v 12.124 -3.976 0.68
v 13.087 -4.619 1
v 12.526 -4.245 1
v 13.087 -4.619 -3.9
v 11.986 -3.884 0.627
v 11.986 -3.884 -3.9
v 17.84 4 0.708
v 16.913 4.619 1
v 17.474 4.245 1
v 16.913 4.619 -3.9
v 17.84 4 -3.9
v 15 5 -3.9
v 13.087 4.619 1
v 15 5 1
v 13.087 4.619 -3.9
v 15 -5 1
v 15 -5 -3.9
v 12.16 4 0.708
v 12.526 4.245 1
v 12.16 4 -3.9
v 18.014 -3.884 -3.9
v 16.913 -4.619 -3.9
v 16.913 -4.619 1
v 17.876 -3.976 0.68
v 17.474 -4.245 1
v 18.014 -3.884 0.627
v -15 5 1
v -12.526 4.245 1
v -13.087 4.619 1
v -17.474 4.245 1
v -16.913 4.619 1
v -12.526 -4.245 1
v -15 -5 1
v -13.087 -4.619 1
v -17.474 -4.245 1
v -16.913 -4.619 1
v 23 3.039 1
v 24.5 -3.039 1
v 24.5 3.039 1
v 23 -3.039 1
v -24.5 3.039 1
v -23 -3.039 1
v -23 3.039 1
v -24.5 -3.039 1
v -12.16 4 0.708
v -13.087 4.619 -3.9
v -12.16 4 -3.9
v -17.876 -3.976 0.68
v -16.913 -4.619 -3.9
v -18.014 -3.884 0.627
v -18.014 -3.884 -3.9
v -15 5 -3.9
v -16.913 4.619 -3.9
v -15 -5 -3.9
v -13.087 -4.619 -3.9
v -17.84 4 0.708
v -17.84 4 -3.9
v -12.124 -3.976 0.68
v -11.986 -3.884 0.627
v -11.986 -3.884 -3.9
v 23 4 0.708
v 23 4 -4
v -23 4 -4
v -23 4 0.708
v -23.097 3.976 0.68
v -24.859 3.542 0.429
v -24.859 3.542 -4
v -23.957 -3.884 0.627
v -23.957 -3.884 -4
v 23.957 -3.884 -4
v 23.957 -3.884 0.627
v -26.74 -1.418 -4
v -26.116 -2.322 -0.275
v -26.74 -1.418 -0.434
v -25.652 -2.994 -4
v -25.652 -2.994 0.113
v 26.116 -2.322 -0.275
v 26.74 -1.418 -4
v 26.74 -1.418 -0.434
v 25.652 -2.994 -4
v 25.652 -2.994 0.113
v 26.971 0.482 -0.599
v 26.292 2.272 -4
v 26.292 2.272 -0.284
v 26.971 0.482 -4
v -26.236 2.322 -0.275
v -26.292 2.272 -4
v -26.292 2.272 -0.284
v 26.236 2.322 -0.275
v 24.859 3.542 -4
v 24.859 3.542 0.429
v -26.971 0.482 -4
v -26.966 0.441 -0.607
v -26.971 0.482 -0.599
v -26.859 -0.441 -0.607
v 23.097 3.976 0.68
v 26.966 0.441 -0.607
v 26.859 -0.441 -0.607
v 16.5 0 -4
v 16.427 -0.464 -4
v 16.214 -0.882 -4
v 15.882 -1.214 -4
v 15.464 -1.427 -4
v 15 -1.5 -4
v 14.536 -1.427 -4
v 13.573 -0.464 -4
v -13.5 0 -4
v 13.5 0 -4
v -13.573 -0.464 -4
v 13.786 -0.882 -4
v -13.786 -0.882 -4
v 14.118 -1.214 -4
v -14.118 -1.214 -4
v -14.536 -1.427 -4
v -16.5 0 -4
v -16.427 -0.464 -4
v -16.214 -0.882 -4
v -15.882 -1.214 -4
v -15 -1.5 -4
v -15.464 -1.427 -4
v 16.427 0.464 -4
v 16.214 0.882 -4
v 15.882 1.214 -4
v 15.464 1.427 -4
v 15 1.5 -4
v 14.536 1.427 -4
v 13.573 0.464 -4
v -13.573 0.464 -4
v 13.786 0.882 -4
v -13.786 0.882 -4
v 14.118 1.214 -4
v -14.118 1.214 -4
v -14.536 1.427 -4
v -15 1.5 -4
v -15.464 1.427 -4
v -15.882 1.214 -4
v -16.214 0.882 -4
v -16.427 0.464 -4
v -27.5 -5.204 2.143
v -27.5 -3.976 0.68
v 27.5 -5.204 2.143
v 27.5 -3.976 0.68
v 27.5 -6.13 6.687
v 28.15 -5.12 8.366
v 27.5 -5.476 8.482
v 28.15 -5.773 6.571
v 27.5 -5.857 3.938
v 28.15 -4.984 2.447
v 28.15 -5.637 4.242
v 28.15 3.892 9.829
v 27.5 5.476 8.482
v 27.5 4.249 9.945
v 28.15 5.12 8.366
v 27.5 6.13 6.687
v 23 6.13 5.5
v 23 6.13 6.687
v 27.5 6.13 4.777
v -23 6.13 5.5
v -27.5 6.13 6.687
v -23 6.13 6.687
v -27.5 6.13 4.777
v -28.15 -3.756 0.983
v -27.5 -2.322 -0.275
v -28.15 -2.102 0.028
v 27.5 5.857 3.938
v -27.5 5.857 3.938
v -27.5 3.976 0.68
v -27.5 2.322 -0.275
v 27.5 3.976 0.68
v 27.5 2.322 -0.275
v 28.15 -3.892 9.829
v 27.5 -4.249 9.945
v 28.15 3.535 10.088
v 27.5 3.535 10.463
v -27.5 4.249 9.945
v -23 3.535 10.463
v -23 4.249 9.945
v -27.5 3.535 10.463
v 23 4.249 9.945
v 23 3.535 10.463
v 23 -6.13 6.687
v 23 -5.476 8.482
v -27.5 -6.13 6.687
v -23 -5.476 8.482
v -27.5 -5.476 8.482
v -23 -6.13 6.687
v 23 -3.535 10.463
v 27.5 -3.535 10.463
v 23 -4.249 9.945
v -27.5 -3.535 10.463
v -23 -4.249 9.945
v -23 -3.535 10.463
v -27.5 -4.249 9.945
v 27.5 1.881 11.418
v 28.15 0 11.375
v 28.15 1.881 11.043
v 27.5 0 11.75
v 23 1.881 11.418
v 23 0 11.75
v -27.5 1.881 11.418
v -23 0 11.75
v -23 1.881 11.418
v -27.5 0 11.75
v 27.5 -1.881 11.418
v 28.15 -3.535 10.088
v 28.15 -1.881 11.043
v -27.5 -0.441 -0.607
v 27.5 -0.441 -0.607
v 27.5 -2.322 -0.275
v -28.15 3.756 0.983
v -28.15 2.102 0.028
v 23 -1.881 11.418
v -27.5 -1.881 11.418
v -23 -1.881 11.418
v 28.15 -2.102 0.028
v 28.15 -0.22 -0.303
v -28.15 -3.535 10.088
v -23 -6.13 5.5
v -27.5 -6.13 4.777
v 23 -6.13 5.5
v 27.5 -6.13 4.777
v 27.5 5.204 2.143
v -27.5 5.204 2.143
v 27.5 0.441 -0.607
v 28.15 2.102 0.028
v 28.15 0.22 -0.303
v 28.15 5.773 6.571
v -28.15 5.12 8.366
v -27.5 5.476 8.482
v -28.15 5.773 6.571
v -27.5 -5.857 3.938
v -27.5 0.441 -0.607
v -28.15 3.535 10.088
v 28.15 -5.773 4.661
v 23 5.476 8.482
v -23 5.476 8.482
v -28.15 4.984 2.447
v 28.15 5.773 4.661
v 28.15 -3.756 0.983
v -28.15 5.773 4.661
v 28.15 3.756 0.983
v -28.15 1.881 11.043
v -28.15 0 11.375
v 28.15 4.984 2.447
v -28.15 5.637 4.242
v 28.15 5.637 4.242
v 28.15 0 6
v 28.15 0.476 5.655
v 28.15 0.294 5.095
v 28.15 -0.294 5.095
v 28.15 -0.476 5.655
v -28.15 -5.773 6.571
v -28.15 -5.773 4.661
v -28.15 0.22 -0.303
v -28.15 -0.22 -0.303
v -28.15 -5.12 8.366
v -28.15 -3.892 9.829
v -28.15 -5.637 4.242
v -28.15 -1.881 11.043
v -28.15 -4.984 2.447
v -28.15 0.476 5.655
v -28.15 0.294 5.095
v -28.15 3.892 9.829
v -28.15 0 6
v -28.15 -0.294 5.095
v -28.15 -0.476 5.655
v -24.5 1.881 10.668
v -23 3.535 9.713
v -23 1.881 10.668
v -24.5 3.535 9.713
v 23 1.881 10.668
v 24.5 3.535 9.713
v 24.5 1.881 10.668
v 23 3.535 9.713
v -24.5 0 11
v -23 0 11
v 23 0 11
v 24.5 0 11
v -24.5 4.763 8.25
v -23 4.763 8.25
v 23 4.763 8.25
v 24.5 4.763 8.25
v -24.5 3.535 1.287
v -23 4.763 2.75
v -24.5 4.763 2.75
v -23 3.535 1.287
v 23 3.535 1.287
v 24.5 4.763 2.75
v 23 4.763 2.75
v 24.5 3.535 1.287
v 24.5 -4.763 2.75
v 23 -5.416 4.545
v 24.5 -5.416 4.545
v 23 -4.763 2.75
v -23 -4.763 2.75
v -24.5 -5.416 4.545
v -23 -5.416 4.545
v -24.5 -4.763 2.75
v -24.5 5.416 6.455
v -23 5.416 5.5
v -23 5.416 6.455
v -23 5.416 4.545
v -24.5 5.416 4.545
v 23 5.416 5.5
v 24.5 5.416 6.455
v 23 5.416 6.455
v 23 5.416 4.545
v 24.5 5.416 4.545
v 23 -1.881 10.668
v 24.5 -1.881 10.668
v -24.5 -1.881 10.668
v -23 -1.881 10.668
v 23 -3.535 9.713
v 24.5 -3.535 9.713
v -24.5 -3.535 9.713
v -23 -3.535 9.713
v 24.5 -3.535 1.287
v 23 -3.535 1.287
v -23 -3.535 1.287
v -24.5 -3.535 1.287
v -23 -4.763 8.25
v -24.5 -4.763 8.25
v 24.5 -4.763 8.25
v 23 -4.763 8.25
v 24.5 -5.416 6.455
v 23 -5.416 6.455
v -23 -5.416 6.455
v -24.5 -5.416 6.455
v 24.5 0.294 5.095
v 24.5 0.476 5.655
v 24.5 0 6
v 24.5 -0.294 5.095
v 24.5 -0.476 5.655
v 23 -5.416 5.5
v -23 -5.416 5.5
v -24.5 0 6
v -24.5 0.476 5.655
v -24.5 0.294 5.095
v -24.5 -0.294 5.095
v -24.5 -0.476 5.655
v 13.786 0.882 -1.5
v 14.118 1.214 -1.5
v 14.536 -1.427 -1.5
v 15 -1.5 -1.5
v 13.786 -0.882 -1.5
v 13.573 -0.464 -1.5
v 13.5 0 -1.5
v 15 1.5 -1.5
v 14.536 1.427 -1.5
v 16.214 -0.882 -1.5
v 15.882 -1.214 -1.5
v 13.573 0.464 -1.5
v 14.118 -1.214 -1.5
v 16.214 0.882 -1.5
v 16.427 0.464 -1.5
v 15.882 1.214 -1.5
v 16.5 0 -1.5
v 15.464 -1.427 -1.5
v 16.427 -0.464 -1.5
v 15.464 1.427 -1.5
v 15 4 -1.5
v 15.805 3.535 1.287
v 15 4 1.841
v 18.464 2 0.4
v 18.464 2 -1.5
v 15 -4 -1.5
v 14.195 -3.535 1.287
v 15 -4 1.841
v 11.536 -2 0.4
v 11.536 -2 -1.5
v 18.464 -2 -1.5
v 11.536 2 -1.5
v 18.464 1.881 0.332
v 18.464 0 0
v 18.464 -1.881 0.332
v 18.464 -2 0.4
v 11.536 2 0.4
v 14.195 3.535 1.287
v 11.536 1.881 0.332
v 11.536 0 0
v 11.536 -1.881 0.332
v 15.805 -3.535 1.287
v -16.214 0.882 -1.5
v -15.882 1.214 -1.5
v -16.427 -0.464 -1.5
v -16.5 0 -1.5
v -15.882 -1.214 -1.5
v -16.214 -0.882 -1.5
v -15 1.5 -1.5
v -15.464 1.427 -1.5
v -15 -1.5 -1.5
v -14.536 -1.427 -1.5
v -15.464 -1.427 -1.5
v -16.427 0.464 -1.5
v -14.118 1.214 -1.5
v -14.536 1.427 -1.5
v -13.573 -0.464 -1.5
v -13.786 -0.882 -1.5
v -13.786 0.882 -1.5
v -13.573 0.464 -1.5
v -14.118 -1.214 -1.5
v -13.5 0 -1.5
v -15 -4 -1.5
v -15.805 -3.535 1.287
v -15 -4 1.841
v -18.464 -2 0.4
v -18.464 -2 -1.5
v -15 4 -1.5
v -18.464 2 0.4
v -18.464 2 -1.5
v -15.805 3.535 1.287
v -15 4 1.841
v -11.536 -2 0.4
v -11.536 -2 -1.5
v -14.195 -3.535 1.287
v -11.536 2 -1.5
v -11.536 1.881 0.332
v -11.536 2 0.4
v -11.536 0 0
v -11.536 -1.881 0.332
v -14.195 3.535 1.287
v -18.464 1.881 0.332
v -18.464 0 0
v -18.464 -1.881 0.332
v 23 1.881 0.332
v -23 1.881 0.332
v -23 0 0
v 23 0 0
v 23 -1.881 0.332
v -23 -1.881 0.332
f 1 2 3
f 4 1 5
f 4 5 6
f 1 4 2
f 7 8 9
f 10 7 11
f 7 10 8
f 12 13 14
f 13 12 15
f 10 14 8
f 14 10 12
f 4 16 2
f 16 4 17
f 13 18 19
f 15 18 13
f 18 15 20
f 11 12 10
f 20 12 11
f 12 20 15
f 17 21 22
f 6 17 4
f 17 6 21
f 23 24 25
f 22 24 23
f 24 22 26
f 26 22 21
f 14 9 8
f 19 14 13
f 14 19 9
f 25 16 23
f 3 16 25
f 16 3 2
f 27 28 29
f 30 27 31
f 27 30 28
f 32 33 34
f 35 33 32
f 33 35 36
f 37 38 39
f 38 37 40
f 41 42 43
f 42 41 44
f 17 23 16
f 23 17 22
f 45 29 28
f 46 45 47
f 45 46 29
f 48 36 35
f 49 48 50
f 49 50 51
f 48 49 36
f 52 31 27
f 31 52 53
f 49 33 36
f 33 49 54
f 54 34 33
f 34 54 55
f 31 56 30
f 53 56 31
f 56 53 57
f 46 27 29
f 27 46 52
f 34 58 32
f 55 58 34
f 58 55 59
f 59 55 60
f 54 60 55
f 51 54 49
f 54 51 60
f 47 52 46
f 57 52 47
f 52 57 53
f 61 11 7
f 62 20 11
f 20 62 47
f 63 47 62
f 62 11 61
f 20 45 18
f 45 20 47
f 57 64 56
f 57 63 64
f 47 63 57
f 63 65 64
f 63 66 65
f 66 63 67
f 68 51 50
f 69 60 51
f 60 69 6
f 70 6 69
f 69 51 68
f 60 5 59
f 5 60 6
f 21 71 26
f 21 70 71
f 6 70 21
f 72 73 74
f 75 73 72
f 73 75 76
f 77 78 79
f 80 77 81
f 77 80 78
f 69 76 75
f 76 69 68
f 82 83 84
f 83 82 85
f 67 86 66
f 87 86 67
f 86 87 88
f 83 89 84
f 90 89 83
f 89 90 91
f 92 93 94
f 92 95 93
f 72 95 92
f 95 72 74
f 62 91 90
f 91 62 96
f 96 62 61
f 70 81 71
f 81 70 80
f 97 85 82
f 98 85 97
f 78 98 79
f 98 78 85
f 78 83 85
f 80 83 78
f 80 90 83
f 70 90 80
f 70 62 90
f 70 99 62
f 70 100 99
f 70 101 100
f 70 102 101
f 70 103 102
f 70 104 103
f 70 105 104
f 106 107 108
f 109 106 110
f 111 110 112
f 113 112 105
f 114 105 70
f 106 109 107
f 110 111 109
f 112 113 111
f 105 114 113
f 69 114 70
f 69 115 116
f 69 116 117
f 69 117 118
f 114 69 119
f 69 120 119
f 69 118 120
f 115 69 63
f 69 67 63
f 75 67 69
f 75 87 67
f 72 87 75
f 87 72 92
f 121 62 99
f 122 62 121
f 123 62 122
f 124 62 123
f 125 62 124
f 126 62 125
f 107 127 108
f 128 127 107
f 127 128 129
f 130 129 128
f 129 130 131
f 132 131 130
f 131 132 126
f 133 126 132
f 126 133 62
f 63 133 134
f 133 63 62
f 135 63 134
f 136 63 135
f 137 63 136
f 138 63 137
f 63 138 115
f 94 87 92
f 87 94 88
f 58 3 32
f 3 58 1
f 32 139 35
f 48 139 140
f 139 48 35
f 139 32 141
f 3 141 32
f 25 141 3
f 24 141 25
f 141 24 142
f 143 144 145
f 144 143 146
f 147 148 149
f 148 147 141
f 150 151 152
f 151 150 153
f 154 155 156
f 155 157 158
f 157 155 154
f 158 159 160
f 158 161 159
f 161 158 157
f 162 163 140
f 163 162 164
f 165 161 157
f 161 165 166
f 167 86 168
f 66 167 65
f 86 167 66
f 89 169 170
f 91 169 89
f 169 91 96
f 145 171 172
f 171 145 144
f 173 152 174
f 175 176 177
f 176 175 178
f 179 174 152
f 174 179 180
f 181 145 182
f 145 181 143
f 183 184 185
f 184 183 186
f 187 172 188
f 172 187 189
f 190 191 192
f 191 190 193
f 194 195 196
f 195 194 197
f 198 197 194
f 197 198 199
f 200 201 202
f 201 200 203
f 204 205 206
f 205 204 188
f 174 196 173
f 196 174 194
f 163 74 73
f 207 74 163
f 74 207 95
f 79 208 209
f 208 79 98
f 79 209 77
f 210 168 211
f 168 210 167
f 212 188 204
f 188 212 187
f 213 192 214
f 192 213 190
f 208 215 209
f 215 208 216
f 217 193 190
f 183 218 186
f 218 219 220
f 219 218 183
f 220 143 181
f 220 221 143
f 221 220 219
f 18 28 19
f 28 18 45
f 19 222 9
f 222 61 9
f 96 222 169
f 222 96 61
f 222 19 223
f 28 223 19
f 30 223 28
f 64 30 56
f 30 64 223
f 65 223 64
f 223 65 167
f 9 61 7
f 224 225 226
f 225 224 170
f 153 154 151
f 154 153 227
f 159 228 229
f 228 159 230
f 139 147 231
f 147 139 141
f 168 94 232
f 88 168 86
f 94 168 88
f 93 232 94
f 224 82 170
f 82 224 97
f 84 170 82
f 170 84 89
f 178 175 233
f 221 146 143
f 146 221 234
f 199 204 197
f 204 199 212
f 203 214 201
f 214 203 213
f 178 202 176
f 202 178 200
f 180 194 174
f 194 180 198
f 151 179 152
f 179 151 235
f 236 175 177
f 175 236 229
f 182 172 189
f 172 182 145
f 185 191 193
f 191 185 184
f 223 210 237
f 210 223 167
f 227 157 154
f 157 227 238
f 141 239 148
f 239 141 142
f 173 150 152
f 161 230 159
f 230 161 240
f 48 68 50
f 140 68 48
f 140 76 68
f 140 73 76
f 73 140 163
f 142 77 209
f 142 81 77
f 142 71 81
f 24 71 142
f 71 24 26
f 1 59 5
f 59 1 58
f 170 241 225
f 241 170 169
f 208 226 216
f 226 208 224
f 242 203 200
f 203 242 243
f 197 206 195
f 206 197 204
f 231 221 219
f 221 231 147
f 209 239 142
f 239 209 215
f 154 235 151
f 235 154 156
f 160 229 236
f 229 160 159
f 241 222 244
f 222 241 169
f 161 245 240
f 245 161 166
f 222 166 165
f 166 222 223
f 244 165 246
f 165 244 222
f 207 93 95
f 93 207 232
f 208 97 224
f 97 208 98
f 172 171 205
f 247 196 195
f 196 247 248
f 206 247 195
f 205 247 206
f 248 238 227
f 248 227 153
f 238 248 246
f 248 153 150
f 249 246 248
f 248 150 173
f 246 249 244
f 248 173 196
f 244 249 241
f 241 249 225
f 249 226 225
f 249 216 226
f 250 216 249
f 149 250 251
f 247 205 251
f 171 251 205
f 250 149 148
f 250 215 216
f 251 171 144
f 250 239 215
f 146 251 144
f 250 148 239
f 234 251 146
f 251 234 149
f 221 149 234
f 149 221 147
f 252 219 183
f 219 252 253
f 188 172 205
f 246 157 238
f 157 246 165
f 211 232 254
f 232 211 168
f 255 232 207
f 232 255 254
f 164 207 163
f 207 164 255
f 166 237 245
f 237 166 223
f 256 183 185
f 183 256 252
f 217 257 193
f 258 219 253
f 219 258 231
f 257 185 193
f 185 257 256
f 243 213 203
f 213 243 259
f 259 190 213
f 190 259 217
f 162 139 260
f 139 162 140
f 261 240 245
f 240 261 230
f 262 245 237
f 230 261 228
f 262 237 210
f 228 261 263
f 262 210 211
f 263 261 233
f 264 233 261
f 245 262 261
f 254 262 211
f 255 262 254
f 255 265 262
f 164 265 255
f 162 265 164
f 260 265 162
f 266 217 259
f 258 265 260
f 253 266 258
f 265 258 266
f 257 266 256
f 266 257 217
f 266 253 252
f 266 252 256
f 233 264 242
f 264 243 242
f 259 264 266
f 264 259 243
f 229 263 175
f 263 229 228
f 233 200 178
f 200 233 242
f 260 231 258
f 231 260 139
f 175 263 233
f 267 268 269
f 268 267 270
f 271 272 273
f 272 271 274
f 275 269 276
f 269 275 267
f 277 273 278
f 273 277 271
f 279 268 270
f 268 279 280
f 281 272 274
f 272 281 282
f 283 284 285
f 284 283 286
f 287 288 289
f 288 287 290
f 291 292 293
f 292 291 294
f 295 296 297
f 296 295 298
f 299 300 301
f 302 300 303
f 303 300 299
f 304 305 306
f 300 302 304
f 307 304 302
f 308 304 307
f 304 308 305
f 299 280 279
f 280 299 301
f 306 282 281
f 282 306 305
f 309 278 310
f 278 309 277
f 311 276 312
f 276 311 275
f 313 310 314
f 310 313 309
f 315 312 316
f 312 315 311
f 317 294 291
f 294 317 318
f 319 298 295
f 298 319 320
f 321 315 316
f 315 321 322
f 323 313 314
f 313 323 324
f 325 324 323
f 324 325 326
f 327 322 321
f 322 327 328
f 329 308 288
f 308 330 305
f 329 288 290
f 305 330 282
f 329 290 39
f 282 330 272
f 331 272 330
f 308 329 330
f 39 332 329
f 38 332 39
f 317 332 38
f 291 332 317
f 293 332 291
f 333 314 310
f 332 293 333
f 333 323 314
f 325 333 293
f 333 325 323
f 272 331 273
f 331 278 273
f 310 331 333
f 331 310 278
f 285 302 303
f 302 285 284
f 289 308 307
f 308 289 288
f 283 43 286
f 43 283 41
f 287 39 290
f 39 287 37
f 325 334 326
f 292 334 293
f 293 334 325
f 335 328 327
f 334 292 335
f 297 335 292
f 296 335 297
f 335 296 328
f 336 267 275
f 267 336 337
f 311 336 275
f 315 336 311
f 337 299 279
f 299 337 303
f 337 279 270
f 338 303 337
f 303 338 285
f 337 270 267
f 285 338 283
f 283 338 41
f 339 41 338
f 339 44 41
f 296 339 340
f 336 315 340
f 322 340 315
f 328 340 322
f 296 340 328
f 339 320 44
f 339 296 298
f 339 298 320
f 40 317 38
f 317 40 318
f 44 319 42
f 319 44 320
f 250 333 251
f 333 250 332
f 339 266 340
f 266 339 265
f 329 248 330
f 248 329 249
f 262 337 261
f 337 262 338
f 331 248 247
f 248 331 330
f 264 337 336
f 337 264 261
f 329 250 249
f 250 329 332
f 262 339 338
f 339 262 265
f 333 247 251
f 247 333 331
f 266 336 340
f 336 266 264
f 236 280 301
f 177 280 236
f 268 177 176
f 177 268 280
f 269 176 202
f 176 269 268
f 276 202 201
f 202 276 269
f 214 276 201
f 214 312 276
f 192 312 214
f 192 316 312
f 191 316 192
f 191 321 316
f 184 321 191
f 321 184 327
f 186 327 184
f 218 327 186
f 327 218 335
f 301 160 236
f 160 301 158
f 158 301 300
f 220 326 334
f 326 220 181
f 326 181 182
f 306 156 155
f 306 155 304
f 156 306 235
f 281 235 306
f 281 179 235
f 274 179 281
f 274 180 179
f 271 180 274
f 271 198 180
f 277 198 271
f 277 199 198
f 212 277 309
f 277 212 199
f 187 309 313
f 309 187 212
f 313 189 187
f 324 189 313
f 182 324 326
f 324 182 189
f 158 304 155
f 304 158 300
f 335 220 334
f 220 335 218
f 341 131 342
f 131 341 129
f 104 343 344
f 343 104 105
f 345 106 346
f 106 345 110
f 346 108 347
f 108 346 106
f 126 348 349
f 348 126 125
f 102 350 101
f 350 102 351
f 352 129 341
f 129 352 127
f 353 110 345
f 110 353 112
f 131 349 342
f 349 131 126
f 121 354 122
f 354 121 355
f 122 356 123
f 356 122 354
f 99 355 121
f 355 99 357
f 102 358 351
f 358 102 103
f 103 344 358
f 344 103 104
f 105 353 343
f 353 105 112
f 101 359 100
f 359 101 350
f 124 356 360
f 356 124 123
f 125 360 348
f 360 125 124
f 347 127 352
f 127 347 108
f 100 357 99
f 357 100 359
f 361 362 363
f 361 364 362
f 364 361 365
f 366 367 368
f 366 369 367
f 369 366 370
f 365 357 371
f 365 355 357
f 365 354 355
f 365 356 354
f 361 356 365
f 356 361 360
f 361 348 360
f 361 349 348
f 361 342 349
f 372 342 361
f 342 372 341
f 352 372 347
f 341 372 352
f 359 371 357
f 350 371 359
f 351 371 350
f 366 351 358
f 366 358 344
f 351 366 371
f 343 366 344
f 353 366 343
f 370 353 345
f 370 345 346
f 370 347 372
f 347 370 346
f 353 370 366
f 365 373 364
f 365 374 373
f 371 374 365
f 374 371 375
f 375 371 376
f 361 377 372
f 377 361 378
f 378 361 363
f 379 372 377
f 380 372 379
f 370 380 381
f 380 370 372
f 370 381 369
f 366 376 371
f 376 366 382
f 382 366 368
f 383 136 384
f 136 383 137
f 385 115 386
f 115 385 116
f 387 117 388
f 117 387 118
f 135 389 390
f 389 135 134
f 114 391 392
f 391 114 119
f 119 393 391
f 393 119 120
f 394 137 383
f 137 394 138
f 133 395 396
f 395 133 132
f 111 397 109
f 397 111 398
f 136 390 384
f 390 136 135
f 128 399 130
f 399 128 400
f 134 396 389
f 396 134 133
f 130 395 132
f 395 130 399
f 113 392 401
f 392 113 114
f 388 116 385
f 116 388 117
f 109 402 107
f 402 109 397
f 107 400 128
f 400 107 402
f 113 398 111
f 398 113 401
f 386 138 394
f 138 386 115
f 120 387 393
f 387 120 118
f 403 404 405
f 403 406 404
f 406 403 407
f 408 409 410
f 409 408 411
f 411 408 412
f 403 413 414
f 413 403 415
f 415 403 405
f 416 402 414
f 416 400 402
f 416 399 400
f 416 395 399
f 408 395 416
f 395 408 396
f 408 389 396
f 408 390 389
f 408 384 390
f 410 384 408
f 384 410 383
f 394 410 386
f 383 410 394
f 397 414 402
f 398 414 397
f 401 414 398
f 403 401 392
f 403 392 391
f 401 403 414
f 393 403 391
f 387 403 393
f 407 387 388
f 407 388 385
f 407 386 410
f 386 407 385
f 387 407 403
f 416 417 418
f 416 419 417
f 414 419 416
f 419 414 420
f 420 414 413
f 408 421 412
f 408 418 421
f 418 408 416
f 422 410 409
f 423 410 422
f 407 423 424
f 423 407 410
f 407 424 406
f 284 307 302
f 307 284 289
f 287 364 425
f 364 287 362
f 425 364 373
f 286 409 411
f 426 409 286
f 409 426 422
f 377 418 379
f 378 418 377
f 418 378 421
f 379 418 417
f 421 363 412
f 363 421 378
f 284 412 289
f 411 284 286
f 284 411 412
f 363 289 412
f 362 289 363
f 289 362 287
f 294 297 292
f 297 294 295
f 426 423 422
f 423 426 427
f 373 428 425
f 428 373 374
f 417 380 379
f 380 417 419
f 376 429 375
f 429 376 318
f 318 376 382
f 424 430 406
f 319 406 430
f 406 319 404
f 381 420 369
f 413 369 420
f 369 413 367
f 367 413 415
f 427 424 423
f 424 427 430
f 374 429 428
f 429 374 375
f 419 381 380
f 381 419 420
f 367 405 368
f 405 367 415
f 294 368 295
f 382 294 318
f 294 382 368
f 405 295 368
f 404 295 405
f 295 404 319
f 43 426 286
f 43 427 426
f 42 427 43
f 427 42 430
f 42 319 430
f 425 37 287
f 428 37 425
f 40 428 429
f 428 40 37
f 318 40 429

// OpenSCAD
h=4;  //!no real dimensional significance 
bh=30; //distance between buzzer holes
l=44+2; //length of battery + drawing pins
dp=1.5;
g=1.5; //thickness of plastic
d= 10.5+0.5; //diam of battery + gap
t=3;
rotate([0,-90,0])buzzer(l,d,h,bh,g);
module buzzer(l,d,h,bh,g){
difference(){
union(){
rotate([90,0,0])mirror([1,0,0])bracket(l,d,bh);
bat(l,d,g);
}
translate([d/2,0,0])cylinder(d=d,h=l,center=true); //remake battery hole
translate([t-1,0,0])rotate([90,0,0])bolt(l,d,bh);
}
}

module bat(l,d,g){
    translate([d/2,0,0]) //to line up with bracket
    difference(){
   minkowski(){//outer shell
        sphere(d=g); //rounding
        cylinder(d=d,h=l+2*1.5+2*3,center=true); 
    }
    cylinder(d=d,h=l+1.5*2,center=true);  //battery hole
    cylinder(d=1,h=l+l,center=true);  //drawing pin holes
    translate([d/2,0,0]) cube([d,d+d,l],center=true); //insertion space
    
}
}

module br_bolts(bh){
    for (i=[-1,1])
    for (j = [0:$children-1])
        translate([-1,bh/2*i,0])rotate([0,90,0])children(j);
}

module bracket(l,d,bh){
    hull()
    br_bolts(l) cylinder(r=4,h=5);
    br_bolts(bh) cylinder(r=5,h=4.9);
}

module bolt(l,d,bh){
      br_bolts(bh){
        cylinder(r=1.5,h=20,center=true,$fn=20);  //drill holes
        translate([0,0,0])cylinder(r=4,h=5,center =true,$fn=6);
    }  
}
